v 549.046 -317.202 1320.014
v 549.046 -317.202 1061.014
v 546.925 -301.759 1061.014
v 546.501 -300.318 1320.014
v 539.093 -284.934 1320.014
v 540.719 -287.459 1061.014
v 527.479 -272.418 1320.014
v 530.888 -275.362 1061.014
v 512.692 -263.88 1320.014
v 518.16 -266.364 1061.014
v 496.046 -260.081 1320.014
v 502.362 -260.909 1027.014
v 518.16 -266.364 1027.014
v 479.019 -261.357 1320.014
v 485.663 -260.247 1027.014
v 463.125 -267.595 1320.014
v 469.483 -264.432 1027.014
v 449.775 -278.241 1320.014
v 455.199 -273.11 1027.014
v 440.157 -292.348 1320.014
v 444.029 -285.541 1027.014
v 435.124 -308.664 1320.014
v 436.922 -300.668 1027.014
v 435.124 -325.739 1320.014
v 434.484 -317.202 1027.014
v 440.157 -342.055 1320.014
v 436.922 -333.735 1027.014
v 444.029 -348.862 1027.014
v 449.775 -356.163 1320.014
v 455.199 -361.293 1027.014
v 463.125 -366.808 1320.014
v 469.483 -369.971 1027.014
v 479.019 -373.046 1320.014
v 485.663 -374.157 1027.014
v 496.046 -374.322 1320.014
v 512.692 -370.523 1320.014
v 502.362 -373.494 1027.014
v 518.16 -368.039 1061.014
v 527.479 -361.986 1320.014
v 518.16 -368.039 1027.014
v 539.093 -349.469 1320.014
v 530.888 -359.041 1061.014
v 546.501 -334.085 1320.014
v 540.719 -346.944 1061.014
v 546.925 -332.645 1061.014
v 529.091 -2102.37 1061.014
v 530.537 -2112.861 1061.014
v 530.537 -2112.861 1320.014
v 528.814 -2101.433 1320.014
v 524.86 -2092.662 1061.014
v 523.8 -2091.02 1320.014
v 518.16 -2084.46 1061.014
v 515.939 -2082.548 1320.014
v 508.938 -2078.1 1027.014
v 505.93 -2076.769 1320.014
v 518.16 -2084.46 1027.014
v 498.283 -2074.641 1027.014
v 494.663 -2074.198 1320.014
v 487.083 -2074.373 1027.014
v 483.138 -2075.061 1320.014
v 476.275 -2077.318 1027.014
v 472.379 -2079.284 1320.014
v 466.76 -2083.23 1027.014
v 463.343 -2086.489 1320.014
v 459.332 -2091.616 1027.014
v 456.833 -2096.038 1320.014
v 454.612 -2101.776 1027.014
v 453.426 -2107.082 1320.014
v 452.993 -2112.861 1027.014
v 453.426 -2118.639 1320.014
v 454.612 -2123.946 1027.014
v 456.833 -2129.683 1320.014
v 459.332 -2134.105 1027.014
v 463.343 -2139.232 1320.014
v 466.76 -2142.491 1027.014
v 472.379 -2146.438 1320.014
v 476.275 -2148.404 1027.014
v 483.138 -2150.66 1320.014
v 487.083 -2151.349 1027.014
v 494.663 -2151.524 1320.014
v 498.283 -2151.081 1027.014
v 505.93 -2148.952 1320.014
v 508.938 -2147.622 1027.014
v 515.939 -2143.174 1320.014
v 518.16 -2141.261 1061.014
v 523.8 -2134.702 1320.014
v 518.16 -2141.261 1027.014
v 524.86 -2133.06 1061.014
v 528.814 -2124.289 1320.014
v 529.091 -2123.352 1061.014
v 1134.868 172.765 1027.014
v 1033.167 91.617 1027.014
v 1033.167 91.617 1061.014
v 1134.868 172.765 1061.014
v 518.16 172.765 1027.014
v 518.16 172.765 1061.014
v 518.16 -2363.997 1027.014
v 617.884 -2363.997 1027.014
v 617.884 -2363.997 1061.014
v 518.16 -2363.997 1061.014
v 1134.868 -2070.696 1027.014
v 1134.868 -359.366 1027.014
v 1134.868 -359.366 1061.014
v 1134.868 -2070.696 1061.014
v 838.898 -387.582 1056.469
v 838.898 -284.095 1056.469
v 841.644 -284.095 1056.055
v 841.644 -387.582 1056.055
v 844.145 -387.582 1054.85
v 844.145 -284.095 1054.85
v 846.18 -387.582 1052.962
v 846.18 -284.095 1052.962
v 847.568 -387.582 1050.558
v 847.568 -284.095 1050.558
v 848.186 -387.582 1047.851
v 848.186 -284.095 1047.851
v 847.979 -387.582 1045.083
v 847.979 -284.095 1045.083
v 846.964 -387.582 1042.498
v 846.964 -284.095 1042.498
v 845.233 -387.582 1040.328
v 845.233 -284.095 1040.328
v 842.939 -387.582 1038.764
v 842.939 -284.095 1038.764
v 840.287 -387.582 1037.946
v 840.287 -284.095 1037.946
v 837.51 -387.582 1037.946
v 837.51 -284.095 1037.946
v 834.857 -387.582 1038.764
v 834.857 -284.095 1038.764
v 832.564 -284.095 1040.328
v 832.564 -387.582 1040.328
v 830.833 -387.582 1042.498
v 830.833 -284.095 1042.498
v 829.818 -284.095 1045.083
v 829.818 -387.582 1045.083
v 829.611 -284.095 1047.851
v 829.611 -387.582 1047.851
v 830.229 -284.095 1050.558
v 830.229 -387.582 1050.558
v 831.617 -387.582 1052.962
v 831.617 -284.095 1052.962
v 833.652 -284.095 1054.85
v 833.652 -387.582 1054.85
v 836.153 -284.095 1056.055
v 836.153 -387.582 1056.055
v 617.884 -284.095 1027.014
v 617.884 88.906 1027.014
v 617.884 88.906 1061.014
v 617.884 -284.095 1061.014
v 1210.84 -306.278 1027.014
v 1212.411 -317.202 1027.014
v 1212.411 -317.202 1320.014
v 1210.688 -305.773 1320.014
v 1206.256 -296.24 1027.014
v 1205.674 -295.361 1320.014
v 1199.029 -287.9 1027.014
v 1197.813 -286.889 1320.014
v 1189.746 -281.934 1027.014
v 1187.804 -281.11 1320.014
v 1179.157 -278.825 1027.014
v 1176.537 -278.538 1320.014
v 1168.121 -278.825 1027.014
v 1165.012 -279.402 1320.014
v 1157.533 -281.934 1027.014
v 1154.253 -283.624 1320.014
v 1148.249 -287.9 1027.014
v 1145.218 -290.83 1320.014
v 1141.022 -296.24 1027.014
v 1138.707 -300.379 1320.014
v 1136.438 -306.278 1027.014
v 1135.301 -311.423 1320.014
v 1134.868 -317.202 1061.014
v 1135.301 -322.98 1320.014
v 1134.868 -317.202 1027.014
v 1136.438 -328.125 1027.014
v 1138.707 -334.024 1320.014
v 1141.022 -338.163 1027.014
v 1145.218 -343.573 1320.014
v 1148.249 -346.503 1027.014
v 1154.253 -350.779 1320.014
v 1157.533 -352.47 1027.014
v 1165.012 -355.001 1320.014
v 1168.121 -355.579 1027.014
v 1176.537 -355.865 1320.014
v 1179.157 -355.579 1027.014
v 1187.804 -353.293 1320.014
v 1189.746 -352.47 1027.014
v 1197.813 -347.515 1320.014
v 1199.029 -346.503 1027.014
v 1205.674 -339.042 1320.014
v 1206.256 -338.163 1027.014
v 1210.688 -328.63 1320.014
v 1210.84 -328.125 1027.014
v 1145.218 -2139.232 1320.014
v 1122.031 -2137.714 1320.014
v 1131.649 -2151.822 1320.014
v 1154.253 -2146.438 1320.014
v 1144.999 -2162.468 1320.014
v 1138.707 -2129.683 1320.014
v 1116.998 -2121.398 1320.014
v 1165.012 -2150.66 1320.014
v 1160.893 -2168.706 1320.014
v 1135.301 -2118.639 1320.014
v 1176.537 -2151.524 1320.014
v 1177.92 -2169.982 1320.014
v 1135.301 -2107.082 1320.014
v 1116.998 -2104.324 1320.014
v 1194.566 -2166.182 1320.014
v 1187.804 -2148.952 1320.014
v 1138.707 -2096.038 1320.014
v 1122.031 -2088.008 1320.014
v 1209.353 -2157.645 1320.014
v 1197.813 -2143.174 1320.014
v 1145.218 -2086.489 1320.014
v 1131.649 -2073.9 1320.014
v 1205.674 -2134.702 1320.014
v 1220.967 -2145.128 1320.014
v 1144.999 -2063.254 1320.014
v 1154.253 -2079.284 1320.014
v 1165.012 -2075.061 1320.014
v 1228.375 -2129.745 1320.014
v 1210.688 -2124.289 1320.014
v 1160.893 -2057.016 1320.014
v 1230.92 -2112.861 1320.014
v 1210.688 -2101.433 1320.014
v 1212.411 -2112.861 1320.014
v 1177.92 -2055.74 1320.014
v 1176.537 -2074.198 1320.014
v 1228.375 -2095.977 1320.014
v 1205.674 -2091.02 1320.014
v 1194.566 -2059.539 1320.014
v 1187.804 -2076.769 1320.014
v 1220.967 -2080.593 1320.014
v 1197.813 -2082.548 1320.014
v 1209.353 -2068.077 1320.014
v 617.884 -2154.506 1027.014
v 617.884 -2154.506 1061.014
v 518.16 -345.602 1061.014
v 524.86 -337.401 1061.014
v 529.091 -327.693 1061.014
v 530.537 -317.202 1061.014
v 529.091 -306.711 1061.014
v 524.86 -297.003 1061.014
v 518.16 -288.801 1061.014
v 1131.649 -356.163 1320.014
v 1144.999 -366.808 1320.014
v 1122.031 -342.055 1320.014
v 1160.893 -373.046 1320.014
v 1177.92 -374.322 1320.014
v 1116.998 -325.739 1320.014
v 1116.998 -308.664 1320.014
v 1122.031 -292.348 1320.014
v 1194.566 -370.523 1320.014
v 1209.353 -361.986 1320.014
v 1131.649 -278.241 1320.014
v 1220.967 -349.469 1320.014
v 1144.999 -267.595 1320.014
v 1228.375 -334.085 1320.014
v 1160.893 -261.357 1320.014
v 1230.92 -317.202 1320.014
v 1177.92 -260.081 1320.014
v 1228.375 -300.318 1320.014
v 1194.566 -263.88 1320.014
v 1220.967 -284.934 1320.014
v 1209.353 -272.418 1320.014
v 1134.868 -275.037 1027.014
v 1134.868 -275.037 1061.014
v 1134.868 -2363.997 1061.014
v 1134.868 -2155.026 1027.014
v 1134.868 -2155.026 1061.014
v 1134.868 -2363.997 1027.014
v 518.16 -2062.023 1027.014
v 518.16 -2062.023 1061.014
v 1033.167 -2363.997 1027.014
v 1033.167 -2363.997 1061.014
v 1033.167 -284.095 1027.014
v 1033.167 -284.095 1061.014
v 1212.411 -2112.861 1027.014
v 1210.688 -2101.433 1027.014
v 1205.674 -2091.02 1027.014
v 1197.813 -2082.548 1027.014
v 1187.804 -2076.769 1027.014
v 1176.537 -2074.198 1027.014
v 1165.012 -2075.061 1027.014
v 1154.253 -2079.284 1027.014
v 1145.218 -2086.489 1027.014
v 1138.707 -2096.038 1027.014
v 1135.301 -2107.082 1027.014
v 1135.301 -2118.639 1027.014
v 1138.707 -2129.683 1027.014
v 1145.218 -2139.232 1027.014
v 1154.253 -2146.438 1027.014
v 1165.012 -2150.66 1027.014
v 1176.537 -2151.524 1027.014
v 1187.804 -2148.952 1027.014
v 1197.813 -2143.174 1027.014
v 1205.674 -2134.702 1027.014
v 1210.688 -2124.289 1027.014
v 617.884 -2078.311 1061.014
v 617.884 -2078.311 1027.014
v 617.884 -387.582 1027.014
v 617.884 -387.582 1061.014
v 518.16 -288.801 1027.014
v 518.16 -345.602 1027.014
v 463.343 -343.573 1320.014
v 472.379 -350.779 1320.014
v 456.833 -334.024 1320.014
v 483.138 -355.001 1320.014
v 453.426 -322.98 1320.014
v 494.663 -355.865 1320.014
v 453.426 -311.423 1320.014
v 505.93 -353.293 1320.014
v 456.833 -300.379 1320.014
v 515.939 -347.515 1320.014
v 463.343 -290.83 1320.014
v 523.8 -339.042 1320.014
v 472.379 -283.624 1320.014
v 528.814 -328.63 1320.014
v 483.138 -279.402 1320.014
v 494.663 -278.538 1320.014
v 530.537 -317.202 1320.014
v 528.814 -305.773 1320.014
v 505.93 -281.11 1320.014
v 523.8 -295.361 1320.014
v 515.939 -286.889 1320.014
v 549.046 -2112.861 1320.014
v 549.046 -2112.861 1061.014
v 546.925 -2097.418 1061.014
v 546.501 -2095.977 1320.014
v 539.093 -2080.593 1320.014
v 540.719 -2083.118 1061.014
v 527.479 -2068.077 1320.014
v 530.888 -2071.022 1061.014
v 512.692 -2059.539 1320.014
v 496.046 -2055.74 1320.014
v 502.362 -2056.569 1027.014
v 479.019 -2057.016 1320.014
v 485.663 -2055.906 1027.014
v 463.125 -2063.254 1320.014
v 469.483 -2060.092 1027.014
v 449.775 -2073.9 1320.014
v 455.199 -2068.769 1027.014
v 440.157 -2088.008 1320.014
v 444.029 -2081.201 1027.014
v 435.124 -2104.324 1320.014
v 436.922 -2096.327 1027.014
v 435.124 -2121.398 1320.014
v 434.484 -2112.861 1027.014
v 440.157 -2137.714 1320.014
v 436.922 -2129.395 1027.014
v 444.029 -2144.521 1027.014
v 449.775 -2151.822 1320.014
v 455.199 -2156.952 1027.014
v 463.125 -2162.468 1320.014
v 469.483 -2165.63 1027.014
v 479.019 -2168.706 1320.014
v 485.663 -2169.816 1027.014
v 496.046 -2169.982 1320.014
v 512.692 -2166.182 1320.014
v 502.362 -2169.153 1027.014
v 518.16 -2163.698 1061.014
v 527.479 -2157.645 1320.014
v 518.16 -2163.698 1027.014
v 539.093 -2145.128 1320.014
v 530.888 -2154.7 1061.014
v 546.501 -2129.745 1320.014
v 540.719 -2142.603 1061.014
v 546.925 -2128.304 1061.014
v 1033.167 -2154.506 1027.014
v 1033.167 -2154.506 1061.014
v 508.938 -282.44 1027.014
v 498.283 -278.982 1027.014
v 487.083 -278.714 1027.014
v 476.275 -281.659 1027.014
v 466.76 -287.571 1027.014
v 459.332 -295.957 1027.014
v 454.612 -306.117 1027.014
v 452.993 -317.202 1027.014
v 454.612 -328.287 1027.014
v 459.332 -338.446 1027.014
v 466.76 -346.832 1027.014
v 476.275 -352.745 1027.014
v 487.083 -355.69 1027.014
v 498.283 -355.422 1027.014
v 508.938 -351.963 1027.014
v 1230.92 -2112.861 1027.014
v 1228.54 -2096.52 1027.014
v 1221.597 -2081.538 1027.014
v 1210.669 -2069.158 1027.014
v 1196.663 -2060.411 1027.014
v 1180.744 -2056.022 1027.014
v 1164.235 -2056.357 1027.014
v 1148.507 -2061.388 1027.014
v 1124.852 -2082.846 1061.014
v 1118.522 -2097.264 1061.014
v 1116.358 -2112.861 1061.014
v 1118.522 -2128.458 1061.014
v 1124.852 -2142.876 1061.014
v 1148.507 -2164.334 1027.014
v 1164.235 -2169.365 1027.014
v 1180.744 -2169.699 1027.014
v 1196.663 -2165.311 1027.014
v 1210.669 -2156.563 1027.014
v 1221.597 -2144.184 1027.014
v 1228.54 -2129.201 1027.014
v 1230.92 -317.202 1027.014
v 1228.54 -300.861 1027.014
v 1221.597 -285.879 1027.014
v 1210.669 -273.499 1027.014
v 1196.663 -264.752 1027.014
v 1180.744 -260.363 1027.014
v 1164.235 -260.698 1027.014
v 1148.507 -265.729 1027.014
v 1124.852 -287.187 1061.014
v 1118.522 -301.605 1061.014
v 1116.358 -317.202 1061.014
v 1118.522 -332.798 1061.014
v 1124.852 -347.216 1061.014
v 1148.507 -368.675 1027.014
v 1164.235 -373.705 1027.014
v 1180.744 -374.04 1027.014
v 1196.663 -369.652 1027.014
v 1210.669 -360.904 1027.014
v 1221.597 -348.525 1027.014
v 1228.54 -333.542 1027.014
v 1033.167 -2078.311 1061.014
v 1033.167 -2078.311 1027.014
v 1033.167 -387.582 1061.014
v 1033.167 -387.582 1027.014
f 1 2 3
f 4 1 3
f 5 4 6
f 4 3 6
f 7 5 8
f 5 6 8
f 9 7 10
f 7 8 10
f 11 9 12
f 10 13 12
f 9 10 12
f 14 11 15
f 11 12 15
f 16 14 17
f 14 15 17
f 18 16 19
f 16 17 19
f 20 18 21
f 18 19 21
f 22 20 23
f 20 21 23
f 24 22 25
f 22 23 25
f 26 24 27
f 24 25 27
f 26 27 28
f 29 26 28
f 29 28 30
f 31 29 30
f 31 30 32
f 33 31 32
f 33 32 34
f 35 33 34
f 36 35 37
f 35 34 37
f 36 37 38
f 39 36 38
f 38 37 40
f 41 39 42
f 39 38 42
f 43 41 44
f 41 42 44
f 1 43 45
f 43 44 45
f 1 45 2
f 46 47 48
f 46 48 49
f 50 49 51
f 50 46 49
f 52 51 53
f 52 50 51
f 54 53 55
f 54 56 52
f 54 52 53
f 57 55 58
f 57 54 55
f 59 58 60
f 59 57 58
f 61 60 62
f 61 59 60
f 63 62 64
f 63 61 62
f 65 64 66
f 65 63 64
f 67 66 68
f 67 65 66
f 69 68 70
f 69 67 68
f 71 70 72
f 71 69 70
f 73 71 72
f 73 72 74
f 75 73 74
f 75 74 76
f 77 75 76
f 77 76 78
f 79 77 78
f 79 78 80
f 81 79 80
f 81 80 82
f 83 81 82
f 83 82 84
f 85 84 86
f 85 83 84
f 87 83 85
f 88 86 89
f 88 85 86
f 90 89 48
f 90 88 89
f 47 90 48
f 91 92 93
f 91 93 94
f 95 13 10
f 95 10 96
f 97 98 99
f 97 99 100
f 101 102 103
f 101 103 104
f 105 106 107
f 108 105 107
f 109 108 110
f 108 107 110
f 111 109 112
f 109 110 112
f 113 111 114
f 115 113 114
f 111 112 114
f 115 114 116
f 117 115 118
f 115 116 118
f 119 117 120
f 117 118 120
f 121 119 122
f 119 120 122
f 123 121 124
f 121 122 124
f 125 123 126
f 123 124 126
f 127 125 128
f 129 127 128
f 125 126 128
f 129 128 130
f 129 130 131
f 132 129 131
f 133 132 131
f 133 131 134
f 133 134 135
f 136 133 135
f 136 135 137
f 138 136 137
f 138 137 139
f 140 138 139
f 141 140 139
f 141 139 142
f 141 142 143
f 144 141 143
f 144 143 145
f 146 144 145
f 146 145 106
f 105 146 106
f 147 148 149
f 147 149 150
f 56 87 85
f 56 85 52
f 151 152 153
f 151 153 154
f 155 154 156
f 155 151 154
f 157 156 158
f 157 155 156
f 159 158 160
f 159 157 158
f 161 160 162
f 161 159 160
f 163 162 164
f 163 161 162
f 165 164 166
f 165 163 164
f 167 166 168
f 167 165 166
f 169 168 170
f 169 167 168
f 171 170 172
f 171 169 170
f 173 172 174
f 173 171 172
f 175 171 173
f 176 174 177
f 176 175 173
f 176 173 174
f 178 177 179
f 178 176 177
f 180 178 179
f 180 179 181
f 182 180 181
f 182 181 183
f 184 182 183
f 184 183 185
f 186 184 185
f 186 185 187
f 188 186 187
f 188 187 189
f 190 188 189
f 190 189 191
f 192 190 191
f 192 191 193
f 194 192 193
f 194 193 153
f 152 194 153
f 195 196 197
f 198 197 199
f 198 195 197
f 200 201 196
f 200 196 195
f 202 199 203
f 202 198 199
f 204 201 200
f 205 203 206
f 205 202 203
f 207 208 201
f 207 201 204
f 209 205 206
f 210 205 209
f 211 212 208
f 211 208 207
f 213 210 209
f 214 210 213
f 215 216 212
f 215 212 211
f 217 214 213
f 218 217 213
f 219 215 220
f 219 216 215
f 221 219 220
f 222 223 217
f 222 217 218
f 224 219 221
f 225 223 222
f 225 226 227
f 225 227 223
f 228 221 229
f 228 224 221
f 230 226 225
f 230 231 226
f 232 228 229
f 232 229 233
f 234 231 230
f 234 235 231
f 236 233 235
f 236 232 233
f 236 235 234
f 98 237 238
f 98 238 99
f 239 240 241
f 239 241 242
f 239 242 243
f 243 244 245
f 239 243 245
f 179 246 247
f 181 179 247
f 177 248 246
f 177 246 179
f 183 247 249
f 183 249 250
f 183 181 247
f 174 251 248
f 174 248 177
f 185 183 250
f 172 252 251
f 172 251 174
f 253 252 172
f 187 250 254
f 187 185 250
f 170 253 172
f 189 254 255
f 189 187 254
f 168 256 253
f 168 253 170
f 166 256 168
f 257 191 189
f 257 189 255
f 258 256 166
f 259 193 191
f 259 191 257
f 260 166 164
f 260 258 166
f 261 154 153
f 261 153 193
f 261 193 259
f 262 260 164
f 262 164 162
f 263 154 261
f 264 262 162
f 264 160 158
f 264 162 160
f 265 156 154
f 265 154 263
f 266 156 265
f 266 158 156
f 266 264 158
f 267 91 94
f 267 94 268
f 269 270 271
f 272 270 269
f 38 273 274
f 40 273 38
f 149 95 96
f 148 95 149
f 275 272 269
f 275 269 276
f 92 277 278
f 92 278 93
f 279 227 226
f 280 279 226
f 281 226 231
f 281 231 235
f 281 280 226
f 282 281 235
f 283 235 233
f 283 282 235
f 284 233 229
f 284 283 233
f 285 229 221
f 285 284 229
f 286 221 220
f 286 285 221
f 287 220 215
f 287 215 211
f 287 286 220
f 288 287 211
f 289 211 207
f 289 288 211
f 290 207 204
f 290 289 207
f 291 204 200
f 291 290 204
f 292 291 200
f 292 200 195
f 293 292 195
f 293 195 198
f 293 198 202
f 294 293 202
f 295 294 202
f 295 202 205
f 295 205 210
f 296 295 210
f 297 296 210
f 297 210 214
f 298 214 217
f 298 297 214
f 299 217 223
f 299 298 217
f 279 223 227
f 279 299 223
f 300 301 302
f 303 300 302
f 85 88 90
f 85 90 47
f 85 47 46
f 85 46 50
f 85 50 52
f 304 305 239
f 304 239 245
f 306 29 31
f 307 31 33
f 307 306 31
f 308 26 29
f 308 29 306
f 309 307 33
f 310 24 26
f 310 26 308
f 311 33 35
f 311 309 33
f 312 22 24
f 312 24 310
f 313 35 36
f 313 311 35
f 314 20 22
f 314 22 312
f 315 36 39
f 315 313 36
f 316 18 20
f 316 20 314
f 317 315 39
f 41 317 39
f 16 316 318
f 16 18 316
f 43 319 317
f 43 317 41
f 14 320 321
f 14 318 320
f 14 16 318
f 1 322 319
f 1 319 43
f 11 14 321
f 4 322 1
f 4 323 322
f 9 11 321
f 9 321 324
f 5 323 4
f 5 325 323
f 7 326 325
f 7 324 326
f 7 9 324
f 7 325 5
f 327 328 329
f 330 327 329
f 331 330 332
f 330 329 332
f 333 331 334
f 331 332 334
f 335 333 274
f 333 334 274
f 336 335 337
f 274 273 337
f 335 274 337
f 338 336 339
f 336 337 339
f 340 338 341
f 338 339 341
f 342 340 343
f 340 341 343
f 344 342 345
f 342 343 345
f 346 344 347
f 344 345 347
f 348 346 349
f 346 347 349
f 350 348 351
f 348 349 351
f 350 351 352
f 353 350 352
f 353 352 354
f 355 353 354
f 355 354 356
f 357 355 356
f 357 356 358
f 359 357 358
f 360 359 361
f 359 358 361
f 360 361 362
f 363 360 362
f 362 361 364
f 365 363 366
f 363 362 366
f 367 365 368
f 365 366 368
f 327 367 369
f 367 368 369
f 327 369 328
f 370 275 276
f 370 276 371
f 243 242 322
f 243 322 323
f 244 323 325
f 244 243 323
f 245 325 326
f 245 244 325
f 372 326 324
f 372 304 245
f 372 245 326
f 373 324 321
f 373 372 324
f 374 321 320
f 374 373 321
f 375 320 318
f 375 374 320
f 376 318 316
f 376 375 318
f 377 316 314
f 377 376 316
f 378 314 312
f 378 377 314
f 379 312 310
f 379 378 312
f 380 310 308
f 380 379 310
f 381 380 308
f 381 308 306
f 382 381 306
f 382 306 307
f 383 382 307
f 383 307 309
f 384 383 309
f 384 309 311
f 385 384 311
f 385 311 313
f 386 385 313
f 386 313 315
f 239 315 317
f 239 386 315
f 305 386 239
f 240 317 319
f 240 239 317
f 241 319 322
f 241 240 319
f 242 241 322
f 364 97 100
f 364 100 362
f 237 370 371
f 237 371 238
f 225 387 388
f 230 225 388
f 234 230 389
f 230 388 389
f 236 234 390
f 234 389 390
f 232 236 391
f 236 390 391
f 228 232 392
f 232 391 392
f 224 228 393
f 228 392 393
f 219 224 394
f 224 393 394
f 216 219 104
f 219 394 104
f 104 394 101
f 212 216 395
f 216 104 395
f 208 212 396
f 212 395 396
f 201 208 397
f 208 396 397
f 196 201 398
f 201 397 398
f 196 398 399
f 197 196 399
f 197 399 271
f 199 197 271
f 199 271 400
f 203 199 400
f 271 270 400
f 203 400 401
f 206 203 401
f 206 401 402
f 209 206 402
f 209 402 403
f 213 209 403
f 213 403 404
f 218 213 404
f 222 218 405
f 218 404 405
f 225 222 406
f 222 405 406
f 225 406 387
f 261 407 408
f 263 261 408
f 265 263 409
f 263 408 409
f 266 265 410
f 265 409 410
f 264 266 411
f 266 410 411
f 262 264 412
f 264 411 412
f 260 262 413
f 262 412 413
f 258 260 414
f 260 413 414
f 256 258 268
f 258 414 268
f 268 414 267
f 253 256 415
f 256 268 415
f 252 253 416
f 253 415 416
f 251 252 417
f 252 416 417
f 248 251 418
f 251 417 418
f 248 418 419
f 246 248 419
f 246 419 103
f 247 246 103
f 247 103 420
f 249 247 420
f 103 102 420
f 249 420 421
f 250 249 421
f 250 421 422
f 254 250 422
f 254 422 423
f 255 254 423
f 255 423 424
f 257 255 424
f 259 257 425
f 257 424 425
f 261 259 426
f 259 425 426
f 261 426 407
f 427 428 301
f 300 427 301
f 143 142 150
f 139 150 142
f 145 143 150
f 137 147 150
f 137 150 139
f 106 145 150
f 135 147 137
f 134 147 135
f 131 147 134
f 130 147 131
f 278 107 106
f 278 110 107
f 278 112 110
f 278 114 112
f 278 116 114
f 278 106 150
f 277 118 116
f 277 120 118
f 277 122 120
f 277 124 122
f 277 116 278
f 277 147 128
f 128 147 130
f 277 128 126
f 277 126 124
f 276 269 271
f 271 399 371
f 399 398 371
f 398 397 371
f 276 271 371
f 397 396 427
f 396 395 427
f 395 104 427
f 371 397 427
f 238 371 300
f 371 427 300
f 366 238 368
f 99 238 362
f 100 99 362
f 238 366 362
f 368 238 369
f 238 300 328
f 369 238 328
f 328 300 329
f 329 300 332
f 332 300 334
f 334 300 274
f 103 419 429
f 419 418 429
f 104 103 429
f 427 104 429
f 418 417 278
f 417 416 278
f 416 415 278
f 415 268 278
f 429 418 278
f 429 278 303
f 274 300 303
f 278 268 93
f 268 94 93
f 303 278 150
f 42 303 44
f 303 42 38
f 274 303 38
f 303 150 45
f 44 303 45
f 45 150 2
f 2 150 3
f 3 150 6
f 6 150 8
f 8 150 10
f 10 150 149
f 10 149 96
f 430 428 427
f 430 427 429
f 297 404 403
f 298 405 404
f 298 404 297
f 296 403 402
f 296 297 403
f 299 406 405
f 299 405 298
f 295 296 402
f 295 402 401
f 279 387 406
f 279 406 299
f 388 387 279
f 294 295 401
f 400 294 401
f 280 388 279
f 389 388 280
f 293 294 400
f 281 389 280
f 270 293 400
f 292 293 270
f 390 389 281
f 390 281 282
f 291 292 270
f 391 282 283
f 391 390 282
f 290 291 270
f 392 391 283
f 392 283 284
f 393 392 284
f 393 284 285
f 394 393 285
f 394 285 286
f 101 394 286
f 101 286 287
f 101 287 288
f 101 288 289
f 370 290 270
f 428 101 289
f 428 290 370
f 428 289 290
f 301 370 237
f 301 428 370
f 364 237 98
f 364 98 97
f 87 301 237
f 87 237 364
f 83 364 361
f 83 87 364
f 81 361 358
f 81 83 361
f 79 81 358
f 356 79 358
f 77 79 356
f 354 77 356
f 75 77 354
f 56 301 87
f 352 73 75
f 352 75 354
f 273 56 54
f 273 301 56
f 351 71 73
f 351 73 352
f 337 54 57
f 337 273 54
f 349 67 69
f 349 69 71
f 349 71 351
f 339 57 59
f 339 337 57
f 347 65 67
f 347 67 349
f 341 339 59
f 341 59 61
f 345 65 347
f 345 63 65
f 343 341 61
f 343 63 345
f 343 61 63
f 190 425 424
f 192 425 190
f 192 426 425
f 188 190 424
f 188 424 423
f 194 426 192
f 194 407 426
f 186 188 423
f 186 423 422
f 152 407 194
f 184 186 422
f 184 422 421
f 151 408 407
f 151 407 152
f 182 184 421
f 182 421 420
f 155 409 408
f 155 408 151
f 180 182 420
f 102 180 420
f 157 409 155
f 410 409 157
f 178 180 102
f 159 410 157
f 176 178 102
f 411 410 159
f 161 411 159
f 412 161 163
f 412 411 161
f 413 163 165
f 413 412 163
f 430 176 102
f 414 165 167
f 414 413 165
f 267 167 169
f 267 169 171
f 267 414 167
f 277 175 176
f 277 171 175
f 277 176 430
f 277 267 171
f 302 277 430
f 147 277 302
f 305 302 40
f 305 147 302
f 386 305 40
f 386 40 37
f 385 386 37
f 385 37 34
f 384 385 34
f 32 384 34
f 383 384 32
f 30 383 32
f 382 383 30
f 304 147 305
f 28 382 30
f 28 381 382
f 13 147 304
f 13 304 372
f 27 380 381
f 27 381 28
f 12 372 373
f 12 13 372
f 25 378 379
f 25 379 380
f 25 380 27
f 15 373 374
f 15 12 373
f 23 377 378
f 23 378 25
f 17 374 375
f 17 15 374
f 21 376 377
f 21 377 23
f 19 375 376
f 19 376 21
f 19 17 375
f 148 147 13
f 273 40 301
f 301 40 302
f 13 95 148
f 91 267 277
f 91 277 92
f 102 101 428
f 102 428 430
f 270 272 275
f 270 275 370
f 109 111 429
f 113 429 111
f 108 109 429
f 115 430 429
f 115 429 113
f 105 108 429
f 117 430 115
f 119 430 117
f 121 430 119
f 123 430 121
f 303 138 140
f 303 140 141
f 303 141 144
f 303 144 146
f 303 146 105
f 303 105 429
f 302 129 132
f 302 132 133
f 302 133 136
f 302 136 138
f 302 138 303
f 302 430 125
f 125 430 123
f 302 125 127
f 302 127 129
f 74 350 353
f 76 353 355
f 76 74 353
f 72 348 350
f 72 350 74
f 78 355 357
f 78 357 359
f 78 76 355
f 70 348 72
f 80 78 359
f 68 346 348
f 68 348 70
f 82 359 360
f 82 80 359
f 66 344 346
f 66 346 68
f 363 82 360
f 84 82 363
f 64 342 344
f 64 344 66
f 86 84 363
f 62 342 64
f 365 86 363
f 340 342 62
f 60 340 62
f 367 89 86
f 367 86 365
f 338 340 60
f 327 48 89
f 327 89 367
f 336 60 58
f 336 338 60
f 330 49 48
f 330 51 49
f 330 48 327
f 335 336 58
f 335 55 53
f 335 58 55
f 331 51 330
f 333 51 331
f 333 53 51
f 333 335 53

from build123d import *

# Parameters (mm, degrees)
BOSS_EXTRUDE1_START   = 600
SKETCH1_R             = 57.281017464
SKETCH1_R_2           = 38.771715285
BOSS_EXTRUDE1_DEPTH   = 293
SKETCH1_R_3           = 57.28102
SKETCH1_R_4           = 38.771715
BOSS_EXTRUDE1_2_DEPTH = 293
BOSS_EXTRUDE1_3_DEPTH = 293
BOSS_EXTRUDE1_4_DEPTH = 293
SKETCH2_W             = 415.282978995
SKETCH2_H             = 1690.728499163
BOSS_EXTRUDE2_DEPTH   = 34
SKETCH6_R             = 9.313662058
CUT_EXTRUDE3_DEPTH    = 126


with BuildPart() as part:
    # Sketch1 → Boss-Extrude1 (new body)
    with BuildSketch(Plane.XY.offset(427.014108562).offset(BOSS_EXTRUDE1_START)):
        with Locations((1173.639225527, -317.201613393)):
            Circle(SKETCH1_R)
        with Locations((1173.639225527, -317.201613393)):
            Circle(SKETCH1_R_2, mode=Mode.SUBTRACT)
    extrude(amount=BOSS_EXTRUDE1_DEPTH)



with BuildPart() as body_2:
    # Sketch1 → Boss-Extrude1 2 (new body)
    with BuildSketch(Plane.XY.offset(427.014108562).offset(BOSS_EXTRUDE1_START)):
        with Locations((491.765116758, -317.201613393)):
            Circle(SKETCH1_R_3)
        with Locations((491.765116758, -317.201613393)):
            Circle(SKETCH1_R_4, mode=Mode.SUBTRACT)
    extrude(amount=BOSS_EXTRUDE1_2_DEPTH)


with BuildPart() as body_3:
    # Sketch1 → Boss-Extrude1 3 (new body)
    with BuildSketch(Plane.XY.offset(427.014108562).offset(BOSS_EXTRUDE1_START)):
        with Locations((491.765116758, -2112.860849235)):
            Circle(SKETCH1_R_3)
        with Locations((491.765116758, -2112.860849235)):
            Circle(SKETCH1_R_4, mode=Mode.SUBTRACT)
    extrude(amount=BOSS_EXTRUDE1_3_DEPTH)


with BuildPart() as body_4:
    # Sketch1 → Boss-Extrude1 4 (new body)
    with BuildSketch(Plane.XY.offset(427.014108562).offset(BOSS_EXTRUDE1_START)):
        with Locations((1173.639225527, -2112.860849235)):
            Circle(SKETCH1_R_3)
        with Locations((1173.639225527, -2112.860849235)):
            Circle(SKETCH1_R_4, mode=Mode.SUBTRACT)
    extrude(amount=BOSS_EXTRUDE1_4_DEPTH)


with BuildPart() as part_1:
    add(part.part)

    add(body_2.part)  # Boss-Extrude2 merges body 2

    add(body_3.part)  # Boss-Extrude2 merges body 3

    add(body_4.part)  # Boss-Extrude2 merges body 4
    # Sketch2 → Boss-Extrude2 (add)
    with BuildSketch(Plane(origin=(0, 0, 1027.014108562), x_dir=(-1, 0, 0), z_dir=(0, 0, -1))):
        Polygon((-1033.166693927, -2154.506262869), (-617.883714932, -2154.506262869), (-617.883714932, -2363.997444221), (-518.159541103, -2363.997444221), (-518.159541103, 172.765208514), (-617.883714932, 88.905828795), (-617.883714932, -284.095196719), (-1033.166693927, -284.095196719), (-1033.166693927, 91.617150216), (-1134.867510242, 172.765208514), (-1134.867510242, -2363.997444221), (-1033.166693927, -2363.997444221), align=None)
        with Locations((-825.52520443, -1232.946709341)):
            Rectangle(SKETCH2_W, SKETCH2_H, mode=Mode.SUBTRACT)
    extrude(amount=-BOSS_EXTRUDE2_DEPTH)

    # Sketch6 → Cut-Extrude3 (cut)
    with BuildSketch(Plane(origin=(0, -284.095196719, 0), x_dir=(1, 0, 0), z_dir=(0, 1, 0))):
        with Locations(Location((838.898443774, -1047.155157013, 0), (0, 0, 270))):
            Circle(SKETCH6_R)
    extrude(amount=-CUT_EXTRUDE3_DEPTH, mode=Mode.SUBTRACT)


solid = part_1.part
